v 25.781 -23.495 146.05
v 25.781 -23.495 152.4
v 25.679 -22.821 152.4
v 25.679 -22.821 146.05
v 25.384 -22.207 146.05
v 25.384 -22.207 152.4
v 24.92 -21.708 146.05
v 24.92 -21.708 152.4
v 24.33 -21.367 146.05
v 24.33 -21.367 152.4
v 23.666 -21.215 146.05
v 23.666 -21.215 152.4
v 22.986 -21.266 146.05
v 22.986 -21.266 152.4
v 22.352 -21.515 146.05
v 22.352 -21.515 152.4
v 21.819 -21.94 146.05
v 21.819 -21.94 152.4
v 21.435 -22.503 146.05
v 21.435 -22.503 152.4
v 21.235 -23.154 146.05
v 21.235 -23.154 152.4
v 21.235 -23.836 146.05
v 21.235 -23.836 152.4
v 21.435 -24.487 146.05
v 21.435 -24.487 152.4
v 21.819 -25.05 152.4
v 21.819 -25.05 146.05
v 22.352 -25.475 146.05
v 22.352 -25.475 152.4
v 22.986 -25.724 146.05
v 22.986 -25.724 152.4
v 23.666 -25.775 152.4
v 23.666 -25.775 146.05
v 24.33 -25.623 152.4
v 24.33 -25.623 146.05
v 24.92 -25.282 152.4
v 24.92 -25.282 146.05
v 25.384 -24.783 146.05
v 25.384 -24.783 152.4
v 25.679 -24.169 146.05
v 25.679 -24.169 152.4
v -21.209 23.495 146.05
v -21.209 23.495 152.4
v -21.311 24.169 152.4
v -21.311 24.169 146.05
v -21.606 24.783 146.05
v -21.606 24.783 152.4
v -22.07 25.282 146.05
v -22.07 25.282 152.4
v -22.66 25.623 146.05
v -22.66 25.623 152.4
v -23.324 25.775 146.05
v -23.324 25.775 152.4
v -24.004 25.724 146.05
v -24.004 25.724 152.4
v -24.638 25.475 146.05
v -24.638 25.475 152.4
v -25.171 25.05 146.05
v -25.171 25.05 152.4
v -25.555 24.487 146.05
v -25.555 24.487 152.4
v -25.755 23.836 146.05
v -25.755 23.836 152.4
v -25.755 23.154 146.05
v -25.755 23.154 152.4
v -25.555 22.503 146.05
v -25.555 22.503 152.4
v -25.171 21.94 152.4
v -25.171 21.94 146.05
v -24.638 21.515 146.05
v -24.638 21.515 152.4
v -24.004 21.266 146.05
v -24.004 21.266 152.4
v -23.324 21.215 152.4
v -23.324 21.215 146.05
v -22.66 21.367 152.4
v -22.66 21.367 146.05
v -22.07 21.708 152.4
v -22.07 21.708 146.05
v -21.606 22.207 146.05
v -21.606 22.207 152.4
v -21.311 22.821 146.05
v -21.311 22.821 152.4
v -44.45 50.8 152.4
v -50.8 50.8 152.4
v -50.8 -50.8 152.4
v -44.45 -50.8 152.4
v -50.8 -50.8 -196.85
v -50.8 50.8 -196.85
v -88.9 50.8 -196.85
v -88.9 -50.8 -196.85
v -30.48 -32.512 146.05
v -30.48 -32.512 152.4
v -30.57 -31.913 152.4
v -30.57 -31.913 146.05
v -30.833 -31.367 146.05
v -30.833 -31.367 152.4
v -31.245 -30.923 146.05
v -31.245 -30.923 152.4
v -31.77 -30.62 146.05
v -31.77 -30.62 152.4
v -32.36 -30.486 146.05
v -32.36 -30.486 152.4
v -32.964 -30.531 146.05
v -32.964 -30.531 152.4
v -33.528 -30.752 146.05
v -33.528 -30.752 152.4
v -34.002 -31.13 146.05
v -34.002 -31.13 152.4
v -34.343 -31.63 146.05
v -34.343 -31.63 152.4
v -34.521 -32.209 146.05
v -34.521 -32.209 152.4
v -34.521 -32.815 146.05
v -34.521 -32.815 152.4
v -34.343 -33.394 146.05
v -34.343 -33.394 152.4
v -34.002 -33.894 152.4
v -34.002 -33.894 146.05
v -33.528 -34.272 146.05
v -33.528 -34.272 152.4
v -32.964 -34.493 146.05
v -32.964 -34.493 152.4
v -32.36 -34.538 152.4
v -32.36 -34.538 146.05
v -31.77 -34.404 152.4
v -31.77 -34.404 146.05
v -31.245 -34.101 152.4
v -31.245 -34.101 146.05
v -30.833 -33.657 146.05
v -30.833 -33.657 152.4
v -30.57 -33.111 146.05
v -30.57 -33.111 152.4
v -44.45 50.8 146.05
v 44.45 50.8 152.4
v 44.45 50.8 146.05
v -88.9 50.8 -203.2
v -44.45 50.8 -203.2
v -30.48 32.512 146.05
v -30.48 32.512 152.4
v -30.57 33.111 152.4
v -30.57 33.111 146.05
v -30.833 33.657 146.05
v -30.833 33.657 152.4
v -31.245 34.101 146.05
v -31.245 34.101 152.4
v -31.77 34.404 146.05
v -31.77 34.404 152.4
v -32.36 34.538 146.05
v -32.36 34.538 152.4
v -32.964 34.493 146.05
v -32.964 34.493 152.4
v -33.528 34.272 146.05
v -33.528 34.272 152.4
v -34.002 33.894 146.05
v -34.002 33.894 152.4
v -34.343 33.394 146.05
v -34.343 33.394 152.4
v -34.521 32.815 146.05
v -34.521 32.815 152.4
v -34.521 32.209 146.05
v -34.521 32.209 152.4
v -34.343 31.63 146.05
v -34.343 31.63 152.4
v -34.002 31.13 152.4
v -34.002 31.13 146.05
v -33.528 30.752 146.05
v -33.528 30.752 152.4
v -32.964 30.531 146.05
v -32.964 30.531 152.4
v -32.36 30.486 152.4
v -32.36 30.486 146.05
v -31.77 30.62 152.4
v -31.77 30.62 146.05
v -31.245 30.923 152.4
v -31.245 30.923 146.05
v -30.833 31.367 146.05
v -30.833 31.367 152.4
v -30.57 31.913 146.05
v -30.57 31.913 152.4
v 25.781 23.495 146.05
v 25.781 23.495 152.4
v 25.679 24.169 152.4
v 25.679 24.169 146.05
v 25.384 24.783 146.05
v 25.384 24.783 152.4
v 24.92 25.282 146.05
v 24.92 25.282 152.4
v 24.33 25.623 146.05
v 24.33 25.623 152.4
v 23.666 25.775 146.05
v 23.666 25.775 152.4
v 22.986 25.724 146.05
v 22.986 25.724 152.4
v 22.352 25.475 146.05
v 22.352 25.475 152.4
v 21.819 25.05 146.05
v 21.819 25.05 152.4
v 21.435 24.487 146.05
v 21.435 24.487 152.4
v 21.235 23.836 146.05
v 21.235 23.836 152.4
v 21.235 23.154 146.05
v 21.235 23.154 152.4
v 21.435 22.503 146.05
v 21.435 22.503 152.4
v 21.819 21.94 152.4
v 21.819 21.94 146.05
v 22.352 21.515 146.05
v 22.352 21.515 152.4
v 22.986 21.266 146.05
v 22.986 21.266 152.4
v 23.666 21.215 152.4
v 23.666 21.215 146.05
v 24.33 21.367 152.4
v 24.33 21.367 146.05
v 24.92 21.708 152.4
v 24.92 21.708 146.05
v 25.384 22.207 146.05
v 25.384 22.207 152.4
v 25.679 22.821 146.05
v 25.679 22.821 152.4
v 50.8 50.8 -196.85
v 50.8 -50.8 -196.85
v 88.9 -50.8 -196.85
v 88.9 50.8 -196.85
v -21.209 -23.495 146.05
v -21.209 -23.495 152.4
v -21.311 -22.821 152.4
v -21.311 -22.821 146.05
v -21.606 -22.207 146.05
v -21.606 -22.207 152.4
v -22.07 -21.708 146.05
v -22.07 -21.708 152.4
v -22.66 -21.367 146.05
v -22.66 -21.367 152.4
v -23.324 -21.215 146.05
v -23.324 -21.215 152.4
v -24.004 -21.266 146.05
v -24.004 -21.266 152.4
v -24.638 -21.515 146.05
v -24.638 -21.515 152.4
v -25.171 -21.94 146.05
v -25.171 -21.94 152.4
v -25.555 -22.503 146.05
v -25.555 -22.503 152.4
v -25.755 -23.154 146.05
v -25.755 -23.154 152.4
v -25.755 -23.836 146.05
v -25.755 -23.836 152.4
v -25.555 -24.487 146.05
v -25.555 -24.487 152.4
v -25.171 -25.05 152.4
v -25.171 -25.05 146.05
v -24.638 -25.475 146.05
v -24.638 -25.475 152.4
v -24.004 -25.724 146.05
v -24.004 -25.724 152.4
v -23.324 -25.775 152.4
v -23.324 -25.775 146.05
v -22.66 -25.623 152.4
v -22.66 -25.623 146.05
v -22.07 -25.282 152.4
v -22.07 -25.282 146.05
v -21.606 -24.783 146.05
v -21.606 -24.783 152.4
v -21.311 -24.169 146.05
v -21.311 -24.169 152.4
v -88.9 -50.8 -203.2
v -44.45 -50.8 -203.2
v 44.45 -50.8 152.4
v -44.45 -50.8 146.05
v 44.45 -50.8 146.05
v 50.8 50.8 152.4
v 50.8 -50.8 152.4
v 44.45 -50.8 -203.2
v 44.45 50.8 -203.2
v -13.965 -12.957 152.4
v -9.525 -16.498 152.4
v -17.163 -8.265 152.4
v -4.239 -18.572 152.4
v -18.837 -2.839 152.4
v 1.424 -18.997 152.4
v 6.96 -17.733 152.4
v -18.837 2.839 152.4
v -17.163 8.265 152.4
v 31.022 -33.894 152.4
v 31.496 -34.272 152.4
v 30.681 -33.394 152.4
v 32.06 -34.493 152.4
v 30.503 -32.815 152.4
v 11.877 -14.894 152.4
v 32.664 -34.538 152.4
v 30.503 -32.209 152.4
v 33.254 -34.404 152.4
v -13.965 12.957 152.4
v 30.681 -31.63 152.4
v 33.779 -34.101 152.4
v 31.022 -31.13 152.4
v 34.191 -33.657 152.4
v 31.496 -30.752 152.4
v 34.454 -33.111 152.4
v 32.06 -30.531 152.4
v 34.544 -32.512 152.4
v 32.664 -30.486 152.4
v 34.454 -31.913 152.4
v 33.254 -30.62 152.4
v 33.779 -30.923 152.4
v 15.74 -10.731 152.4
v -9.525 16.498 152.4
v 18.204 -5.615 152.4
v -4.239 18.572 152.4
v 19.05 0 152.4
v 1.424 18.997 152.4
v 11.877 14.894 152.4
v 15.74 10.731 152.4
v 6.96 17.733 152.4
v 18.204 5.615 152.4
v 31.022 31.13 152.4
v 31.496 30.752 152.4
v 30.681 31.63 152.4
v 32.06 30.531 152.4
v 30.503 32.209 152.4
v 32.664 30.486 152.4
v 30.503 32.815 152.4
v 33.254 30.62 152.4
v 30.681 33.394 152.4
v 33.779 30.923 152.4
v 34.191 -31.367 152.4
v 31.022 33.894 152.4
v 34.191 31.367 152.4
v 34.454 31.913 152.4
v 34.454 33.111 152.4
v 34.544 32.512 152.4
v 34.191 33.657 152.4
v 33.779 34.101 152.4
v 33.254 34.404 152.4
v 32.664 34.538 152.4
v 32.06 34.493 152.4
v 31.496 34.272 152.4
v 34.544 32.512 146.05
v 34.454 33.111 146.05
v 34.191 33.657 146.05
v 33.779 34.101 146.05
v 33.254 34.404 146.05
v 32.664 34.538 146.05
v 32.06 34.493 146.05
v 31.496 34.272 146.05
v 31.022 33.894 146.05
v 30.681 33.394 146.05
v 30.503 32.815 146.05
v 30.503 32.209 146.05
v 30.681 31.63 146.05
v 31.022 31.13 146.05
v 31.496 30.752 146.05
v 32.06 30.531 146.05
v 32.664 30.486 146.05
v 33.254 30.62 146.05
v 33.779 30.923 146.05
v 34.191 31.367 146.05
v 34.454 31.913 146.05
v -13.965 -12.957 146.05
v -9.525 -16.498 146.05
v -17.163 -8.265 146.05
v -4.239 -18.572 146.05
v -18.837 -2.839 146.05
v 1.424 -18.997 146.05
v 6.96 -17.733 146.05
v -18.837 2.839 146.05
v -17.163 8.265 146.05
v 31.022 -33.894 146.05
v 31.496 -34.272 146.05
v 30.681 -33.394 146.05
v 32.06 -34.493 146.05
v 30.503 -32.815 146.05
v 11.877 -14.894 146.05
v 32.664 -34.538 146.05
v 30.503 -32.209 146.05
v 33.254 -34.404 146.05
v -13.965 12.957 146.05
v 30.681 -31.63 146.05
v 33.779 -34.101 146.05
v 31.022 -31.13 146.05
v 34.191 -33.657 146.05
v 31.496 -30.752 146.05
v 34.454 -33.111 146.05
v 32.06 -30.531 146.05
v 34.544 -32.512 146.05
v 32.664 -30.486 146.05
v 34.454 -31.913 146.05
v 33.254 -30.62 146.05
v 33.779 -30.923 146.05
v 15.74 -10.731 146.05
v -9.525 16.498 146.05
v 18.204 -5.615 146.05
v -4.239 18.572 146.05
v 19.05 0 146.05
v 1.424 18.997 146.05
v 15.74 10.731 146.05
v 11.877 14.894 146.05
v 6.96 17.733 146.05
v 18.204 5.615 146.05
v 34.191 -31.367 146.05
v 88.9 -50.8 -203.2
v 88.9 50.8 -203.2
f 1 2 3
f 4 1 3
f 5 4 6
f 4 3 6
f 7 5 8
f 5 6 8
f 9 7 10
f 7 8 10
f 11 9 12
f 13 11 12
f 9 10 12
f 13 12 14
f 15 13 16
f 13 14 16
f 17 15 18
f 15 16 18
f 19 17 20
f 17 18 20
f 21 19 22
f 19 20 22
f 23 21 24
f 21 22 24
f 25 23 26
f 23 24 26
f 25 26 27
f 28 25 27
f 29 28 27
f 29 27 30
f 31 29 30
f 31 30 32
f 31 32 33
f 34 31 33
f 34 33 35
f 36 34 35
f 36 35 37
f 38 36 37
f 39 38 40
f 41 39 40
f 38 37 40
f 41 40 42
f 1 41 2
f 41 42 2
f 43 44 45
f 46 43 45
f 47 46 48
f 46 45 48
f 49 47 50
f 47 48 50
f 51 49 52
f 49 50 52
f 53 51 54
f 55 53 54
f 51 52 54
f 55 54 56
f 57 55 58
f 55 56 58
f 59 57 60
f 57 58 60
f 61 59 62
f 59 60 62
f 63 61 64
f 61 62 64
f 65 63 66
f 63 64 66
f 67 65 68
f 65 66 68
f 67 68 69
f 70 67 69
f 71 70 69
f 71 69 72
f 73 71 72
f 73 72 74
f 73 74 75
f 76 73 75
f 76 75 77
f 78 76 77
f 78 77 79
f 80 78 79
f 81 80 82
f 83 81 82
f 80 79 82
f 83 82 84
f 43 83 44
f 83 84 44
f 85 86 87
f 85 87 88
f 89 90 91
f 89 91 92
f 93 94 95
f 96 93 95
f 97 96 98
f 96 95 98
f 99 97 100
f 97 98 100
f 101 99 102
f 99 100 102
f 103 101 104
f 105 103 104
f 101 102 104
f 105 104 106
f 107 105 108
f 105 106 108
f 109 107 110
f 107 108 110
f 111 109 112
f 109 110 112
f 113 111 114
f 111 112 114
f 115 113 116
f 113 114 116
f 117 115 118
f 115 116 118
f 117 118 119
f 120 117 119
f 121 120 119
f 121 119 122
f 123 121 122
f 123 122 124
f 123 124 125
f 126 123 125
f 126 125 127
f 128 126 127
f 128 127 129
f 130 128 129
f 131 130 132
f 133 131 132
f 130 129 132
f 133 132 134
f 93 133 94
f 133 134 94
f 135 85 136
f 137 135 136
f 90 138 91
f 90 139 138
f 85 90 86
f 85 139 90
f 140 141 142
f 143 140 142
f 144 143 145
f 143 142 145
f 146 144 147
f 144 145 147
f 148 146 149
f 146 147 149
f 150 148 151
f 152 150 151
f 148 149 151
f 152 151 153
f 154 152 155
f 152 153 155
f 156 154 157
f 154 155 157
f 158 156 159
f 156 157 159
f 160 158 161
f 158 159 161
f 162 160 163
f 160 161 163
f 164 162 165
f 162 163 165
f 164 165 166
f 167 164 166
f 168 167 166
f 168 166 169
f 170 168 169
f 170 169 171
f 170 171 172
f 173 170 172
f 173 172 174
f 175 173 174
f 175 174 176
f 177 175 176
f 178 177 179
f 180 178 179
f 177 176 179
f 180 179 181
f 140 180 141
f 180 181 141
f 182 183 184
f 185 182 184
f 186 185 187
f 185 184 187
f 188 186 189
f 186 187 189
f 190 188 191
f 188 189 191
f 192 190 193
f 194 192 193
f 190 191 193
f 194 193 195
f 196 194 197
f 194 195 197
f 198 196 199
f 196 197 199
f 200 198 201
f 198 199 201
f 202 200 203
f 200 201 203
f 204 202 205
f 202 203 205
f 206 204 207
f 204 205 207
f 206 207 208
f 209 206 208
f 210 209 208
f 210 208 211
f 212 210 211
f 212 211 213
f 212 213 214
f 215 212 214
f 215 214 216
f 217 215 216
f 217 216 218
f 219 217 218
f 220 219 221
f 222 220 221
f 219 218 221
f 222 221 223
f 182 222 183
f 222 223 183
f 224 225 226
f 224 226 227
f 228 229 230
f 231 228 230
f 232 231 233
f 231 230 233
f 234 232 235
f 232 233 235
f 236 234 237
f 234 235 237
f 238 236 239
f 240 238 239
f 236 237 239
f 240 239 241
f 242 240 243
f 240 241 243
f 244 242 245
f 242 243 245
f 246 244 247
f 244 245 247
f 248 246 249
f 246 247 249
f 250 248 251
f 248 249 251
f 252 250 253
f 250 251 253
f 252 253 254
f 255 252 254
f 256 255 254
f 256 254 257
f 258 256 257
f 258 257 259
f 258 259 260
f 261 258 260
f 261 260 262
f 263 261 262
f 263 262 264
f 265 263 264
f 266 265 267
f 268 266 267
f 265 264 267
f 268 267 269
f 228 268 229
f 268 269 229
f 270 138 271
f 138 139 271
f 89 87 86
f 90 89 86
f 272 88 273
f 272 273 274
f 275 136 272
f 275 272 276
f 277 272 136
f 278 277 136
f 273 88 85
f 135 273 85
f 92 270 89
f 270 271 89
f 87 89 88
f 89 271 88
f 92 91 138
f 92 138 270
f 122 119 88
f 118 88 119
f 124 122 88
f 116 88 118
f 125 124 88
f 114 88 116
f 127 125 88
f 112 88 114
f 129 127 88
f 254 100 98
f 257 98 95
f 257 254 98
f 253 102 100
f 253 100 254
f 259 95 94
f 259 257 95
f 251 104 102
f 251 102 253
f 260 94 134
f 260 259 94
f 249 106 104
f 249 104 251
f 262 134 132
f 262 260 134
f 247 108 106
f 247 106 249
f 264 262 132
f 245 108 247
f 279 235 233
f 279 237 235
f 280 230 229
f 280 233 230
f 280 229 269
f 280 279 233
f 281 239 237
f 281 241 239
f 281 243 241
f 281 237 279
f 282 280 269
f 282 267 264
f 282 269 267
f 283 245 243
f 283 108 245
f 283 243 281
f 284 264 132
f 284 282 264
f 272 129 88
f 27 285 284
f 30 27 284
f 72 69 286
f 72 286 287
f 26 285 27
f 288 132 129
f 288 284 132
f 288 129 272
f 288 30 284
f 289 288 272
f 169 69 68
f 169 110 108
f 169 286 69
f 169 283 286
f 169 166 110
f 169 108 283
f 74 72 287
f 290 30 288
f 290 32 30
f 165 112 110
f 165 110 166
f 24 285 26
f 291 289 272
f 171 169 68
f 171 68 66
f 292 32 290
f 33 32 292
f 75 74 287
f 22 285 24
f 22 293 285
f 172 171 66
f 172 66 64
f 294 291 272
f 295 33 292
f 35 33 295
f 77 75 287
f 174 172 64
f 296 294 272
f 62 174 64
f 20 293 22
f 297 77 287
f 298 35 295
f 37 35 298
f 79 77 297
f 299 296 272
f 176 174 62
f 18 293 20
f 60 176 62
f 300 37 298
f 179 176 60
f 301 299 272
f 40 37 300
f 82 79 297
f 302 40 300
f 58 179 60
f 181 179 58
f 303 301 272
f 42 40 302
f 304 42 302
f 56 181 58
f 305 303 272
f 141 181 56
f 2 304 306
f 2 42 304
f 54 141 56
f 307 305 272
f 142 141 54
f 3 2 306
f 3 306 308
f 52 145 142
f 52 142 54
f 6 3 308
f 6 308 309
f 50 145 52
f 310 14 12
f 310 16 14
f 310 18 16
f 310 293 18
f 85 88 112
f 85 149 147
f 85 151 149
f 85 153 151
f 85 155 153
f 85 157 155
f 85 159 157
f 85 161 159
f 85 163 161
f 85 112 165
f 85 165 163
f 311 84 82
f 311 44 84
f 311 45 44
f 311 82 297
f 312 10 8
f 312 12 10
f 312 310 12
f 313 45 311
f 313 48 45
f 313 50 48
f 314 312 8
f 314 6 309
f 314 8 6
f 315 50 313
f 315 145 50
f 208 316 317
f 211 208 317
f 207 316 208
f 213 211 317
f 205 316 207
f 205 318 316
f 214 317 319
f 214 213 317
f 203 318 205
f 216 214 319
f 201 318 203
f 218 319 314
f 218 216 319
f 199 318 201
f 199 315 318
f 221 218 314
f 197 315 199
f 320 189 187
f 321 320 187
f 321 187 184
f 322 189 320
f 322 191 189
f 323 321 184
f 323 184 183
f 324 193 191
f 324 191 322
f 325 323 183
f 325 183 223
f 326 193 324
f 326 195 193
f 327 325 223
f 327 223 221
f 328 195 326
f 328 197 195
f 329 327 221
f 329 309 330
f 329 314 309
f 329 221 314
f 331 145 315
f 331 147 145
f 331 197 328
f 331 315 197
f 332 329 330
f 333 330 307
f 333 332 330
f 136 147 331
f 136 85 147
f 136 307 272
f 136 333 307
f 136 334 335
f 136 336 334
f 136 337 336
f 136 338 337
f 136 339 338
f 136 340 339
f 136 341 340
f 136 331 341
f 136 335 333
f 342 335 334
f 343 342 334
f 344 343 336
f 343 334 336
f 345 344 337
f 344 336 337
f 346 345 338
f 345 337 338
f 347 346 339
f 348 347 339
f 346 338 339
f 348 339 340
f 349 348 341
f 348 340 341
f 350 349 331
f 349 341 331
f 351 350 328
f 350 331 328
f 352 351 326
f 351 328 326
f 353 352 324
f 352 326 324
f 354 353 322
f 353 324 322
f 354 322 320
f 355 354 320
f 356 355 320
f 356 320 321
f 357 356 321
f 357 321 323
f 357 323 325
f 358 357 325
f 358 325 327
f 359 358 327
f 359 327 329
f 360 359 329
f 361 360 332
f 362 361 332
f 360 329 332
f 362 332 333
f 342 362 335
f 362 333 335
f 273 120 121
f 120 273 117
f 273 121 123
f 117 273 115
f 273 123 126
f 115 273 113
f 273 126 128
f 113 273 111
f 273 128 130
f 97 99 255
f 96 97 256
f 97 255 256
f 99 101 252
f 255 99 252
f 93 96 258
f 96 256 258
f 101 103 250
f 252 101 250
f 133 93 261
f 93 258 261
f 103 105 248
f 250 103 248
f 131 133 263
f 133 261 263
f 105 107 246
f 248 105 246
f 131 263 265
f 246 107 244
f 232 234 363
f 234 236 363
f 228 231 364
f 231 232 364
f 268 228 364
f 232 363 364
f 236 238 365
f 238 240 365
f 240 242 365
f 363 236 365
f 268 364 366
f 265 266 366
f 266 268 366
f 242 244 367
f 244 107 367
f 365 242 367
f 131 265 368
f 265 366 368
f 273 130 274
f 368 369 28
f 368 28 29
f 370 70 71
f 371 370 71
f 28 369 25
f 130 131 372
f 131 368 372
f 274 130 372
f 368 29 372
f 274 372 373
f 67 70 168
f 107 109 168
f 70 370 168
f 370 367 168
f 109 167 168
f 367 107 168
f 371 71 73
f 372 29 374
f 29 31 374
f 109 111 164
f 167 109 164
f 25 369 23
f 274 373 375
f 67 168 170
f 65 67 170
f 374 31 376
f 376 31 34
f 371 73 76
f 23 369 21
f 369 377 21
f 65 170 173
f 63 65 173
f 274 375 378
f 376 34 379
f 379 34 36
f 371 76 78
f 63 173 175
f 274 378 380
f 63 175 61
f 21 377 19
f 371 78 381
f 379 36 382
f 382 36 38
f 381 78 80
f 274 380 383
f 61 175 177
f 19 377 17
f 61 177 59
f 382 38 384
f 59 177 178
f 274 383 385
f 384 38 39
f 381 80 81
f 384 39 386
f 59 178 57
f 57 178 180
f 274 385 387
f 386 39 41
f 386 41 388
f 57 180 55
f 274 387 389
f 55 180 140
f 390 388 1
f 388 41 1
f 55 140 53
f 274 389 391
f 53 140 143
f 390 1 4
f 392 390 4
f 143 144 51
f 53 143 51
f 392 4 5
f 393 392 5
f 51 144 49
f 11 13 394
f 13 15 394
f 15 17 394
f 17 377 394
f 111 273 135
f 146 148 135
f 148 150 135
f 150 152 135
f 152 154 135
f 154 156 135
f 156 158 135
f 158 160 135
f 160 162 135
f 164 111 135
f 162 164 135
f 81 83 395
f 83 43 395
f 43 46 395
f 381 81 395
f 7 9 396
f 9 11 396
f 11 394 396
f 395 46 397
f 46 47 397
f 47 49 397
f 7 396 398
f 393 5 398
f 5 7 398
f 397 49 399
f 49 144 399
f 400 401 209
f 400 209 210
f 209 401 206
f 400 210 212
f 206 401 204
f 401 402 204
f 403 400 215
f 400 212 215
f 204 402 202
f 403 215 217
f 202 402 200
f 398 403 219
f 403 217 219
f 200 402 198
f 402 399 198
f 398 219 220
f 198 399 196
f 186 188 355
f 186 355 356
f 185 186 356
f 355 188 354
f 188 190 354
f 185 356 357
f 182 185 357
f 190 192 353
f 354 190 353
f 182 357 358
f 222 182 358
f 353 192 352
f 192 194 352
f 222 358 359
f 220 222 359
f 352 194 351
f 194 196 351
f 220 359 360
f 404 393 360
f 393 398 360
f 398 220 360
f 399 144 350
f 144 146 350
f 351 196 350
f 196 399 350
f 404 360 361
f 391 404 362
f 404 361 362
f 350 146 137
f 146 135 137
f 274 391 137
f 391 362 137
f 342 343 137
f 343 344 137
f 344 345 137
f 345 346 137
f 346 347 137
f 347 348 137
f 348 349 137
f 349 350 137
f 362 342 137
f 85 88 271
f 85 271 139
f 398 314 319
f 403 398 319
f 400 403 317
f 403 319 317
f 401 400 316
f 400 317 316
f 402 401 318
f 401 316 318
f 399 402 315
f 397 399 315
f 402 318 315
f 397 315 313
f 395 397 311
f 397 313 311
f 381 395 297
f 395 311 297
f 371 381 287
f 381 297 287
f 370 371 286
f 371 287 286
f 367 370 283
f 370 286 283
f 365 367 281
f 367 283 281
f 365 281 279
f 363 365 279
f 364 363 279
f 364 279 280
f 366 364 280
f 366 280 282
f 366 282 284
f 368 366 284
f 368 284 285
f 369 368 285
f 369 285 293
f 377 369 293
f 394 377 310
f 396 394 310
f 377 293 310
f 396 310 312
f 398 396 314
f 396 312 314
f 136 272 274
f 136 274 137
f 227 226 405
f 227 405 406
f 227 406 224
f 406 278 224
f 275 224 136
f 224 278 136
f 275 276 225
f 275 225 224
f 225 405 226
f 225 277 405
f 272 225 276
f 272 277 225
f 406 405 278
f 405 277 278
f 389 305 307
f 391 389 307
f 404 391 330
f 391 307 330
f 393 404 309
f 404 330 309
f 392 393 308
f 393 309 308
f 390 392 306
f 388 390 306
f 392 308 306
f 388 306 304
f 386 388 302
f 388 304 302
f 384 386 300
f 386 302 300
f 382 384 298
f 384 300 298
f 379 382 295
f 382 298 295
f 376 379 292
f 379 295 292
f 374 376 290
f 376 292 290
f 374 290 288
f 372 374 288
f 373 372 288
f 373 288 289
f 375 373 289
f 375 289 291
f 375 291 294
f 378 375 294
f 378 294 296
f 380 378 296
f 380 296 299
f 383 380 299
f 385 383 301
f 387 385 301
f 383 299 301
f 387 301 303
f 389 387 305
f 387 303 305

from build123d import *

# Parameters (mm, degrees)
F1_W     = 88.9
F1_H     = 101.6
F1_R     = 2.032
F1_R_2   = 2.286
F1_R_3   = 19.05
F2_DEPTH = 6.35
F1_W_2   = 6.35
F3_DEPTH = 355.6
F4_W     = 101.6
F4_H     = 6.35
F6_DEPTH = 38.1
F5_W     = 101.6
F5_H     = 6.35
F7_DEPTH = 38.1


with BuildPart() as f2:
    # F1 (on offset) → F2 (new body)
    with BuildSketch(Plane.XY.offset(152.4)):
        Rectangle(F1_W, F1_H)
        with Locations((-32.512, -32.512)):
            Circle(F1_R, mode=Mode.SUBTRACT)
        with Locations((-23.495, -23.495)):
            Circle(F1_R_2, mode=Mode.SUBTRACT)
        Circle(F1_R_3, mode=Mode.SUBTRACT)
        with Locations((32.512, -32.512)):
            Circle(F1_R, mode=Mode.SUBTRACT)
        with Locations((23.495, -23.495)):
            Circle(F1_R_2, mode=Mode.SUBTRACT)
        with Locations((-23.495, 23.495)):
            Circle(F1_R_2, mode=Mode.SUBTRACT)
        with Locations((-32.512, 32.512)):
            Circle(F1_R, mode=Mode.SUBTRACT)
        with Locations((23.495, 23.495)):
            Circle(F1_R_2, mode=Mode.SUBTRACT)
        with Locations((32.512, 32.512)):
            Circle(F1_R, mode=Mode.SUBTRACT)
    extrude(amount=-F2_DEPTH)


with BuildPart() as f3:
    # F1 (on offset) → F3 (new body)
    with BuildSketch(Plane.XY.offset(152.4)):
        with Locations((-47.625, 0)):
            Rectangle(F1_W_2, F1_H)
        with Locations((47.625, 0)):
            Rectangle(F1_W_2, F1_H)
    extrude(amount=-F3_DEPTH)

    # F4 (on face) → F6 (join)
    with BuildSketch(Plane(origin=(-50.8, 0, 0), x_dir=(0, -1, 0), z_dir=(-1, 0, 0))):
        with Locations((0, -200.025)):
            Rectangle(F4_W, F4_H)
    extrude(amount=F6_DEPTH)

    # F5 (on face) → F7 (join)
    with BuildSketch(Plane.YZ.offset(50.8)):
        with Locations((0, -200.025)):
            Rectangle(F5_W, F5_H)
    extrude(amount=F7_DEPTH)


solid = Compound([f2.part, f3.part])
